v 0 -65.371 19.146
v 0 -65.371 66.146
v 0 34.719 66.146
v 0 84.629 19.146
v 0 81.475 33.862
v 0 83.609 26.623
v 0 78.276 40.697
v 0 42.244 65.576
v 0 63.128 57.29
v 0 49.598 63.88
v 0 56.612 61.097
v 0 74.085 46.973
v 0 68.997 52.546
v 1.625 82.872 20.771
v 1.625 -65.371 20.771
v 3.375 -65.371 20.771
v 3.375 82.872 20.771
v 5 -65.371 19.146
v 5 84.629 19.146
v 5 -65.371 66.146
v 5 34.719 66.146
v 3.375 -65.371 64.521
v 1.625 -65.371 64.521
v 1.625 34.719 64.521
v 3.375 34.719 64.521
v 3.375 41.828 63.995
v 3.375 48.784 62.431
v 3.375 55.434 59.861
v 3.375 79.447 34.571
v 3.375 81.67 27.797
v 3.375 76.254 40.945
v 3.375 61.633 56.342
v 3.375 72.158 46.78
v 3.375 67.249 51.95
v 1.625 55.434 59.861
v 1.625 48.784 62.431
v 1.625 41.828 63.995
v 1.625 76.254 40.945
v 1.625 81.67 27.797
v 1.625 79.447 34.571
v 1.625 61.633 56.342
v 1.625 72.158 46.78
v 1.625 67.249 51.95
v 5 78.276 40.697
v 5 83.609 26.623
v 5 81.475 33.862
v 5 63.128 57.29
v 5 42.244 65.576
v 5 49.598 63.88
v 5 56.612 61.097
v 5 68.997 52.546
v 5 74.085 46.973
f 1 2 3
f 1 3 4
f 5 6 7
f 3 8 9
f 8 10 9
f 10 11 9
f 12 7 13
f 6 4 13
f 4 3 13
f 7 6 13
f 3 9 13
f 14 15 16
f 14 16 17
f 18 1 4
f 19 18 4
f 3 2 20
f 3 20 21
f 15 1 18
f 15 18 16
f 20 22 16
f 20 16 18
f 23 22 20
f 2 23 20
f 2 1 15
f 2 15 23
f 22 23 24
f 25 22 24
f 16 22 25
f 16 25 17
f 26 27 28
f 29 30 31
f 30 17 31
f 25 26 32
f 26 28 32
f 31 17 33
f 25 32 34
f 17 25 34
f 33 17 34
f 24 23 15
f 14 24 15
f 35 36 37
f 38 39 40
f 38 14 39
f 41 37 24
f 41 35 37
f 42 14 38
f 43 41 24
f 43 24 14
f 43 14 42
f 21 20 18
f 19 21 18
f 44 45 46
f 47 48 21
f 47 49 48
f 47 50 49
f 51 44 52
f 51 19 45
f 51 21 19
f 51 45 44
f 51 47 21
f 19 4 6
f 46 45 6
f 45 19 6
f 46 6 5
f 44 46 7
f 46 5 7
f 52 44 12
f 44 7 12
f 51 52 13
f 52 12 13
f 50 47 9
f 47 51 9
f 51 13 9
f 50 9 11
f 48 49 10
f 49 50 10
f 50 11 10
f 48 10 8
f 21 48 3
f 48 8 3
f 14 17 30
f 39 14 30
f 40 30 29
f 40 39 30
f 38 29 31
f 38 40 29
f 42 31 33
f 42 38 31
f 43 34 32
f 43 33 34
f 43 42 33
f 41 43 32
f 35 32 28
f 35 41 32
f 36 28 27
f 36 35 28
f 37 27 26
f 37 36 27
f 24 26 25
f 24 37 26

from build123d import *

# Parameters (mm, degrees)
F0_W        = 150
F0_H        = 47
F1_DEPTH    = 5
F2_T1_DEPTH = 254.5495942694
F3_T        = -1.625


# Not quite as in the source:
# - a fillet or chamfer that OpenCascade refuses, or shapes differently, is made with other operations: its cross-section is extruded or revolved along the edge and cut away or added


with BuildPart() as f1:
    # F0 (on Right) → F1 (new body)
    with BuildSketch(Plane.YZ):
        with Locations((9.6287353195, 42.6455706358)):
            Rectangle(F0_W, F0_H)
    extrude(amount=F1_DEPTH)

    # F2: fillet of radius 50 on 1 edges, made by hand

    # F2_s2 → F2_t1 (cut)
    with BuildSketch(Plane.YZ.offset(-124.7747971347)):
        with BuildLine():
            ThreePointArc((84.6287353195, 19.1455706358), (68.9970894677, 52.5461200822), (34.7188164657, 66.1455706358))
            Line((34.7188164657, 66.1455706358), (84.6287353195, 66.1455706358))
            Line((84.6287353195, 66.1455706358), (84.6287353195, 19.1455706358))
        make_face()
    extrude(amount=F2_T1_DEPTH, mode=Mode.SUBTRACT)

    # F3
    f3_openings = [f1.faces().sort_by_distance(p)[0] for p in [
        (2.5, -65.371265, 42.645571),
    ]]
    offset(amount=F3_T, openings=f3_openings)


solid = f1.part
